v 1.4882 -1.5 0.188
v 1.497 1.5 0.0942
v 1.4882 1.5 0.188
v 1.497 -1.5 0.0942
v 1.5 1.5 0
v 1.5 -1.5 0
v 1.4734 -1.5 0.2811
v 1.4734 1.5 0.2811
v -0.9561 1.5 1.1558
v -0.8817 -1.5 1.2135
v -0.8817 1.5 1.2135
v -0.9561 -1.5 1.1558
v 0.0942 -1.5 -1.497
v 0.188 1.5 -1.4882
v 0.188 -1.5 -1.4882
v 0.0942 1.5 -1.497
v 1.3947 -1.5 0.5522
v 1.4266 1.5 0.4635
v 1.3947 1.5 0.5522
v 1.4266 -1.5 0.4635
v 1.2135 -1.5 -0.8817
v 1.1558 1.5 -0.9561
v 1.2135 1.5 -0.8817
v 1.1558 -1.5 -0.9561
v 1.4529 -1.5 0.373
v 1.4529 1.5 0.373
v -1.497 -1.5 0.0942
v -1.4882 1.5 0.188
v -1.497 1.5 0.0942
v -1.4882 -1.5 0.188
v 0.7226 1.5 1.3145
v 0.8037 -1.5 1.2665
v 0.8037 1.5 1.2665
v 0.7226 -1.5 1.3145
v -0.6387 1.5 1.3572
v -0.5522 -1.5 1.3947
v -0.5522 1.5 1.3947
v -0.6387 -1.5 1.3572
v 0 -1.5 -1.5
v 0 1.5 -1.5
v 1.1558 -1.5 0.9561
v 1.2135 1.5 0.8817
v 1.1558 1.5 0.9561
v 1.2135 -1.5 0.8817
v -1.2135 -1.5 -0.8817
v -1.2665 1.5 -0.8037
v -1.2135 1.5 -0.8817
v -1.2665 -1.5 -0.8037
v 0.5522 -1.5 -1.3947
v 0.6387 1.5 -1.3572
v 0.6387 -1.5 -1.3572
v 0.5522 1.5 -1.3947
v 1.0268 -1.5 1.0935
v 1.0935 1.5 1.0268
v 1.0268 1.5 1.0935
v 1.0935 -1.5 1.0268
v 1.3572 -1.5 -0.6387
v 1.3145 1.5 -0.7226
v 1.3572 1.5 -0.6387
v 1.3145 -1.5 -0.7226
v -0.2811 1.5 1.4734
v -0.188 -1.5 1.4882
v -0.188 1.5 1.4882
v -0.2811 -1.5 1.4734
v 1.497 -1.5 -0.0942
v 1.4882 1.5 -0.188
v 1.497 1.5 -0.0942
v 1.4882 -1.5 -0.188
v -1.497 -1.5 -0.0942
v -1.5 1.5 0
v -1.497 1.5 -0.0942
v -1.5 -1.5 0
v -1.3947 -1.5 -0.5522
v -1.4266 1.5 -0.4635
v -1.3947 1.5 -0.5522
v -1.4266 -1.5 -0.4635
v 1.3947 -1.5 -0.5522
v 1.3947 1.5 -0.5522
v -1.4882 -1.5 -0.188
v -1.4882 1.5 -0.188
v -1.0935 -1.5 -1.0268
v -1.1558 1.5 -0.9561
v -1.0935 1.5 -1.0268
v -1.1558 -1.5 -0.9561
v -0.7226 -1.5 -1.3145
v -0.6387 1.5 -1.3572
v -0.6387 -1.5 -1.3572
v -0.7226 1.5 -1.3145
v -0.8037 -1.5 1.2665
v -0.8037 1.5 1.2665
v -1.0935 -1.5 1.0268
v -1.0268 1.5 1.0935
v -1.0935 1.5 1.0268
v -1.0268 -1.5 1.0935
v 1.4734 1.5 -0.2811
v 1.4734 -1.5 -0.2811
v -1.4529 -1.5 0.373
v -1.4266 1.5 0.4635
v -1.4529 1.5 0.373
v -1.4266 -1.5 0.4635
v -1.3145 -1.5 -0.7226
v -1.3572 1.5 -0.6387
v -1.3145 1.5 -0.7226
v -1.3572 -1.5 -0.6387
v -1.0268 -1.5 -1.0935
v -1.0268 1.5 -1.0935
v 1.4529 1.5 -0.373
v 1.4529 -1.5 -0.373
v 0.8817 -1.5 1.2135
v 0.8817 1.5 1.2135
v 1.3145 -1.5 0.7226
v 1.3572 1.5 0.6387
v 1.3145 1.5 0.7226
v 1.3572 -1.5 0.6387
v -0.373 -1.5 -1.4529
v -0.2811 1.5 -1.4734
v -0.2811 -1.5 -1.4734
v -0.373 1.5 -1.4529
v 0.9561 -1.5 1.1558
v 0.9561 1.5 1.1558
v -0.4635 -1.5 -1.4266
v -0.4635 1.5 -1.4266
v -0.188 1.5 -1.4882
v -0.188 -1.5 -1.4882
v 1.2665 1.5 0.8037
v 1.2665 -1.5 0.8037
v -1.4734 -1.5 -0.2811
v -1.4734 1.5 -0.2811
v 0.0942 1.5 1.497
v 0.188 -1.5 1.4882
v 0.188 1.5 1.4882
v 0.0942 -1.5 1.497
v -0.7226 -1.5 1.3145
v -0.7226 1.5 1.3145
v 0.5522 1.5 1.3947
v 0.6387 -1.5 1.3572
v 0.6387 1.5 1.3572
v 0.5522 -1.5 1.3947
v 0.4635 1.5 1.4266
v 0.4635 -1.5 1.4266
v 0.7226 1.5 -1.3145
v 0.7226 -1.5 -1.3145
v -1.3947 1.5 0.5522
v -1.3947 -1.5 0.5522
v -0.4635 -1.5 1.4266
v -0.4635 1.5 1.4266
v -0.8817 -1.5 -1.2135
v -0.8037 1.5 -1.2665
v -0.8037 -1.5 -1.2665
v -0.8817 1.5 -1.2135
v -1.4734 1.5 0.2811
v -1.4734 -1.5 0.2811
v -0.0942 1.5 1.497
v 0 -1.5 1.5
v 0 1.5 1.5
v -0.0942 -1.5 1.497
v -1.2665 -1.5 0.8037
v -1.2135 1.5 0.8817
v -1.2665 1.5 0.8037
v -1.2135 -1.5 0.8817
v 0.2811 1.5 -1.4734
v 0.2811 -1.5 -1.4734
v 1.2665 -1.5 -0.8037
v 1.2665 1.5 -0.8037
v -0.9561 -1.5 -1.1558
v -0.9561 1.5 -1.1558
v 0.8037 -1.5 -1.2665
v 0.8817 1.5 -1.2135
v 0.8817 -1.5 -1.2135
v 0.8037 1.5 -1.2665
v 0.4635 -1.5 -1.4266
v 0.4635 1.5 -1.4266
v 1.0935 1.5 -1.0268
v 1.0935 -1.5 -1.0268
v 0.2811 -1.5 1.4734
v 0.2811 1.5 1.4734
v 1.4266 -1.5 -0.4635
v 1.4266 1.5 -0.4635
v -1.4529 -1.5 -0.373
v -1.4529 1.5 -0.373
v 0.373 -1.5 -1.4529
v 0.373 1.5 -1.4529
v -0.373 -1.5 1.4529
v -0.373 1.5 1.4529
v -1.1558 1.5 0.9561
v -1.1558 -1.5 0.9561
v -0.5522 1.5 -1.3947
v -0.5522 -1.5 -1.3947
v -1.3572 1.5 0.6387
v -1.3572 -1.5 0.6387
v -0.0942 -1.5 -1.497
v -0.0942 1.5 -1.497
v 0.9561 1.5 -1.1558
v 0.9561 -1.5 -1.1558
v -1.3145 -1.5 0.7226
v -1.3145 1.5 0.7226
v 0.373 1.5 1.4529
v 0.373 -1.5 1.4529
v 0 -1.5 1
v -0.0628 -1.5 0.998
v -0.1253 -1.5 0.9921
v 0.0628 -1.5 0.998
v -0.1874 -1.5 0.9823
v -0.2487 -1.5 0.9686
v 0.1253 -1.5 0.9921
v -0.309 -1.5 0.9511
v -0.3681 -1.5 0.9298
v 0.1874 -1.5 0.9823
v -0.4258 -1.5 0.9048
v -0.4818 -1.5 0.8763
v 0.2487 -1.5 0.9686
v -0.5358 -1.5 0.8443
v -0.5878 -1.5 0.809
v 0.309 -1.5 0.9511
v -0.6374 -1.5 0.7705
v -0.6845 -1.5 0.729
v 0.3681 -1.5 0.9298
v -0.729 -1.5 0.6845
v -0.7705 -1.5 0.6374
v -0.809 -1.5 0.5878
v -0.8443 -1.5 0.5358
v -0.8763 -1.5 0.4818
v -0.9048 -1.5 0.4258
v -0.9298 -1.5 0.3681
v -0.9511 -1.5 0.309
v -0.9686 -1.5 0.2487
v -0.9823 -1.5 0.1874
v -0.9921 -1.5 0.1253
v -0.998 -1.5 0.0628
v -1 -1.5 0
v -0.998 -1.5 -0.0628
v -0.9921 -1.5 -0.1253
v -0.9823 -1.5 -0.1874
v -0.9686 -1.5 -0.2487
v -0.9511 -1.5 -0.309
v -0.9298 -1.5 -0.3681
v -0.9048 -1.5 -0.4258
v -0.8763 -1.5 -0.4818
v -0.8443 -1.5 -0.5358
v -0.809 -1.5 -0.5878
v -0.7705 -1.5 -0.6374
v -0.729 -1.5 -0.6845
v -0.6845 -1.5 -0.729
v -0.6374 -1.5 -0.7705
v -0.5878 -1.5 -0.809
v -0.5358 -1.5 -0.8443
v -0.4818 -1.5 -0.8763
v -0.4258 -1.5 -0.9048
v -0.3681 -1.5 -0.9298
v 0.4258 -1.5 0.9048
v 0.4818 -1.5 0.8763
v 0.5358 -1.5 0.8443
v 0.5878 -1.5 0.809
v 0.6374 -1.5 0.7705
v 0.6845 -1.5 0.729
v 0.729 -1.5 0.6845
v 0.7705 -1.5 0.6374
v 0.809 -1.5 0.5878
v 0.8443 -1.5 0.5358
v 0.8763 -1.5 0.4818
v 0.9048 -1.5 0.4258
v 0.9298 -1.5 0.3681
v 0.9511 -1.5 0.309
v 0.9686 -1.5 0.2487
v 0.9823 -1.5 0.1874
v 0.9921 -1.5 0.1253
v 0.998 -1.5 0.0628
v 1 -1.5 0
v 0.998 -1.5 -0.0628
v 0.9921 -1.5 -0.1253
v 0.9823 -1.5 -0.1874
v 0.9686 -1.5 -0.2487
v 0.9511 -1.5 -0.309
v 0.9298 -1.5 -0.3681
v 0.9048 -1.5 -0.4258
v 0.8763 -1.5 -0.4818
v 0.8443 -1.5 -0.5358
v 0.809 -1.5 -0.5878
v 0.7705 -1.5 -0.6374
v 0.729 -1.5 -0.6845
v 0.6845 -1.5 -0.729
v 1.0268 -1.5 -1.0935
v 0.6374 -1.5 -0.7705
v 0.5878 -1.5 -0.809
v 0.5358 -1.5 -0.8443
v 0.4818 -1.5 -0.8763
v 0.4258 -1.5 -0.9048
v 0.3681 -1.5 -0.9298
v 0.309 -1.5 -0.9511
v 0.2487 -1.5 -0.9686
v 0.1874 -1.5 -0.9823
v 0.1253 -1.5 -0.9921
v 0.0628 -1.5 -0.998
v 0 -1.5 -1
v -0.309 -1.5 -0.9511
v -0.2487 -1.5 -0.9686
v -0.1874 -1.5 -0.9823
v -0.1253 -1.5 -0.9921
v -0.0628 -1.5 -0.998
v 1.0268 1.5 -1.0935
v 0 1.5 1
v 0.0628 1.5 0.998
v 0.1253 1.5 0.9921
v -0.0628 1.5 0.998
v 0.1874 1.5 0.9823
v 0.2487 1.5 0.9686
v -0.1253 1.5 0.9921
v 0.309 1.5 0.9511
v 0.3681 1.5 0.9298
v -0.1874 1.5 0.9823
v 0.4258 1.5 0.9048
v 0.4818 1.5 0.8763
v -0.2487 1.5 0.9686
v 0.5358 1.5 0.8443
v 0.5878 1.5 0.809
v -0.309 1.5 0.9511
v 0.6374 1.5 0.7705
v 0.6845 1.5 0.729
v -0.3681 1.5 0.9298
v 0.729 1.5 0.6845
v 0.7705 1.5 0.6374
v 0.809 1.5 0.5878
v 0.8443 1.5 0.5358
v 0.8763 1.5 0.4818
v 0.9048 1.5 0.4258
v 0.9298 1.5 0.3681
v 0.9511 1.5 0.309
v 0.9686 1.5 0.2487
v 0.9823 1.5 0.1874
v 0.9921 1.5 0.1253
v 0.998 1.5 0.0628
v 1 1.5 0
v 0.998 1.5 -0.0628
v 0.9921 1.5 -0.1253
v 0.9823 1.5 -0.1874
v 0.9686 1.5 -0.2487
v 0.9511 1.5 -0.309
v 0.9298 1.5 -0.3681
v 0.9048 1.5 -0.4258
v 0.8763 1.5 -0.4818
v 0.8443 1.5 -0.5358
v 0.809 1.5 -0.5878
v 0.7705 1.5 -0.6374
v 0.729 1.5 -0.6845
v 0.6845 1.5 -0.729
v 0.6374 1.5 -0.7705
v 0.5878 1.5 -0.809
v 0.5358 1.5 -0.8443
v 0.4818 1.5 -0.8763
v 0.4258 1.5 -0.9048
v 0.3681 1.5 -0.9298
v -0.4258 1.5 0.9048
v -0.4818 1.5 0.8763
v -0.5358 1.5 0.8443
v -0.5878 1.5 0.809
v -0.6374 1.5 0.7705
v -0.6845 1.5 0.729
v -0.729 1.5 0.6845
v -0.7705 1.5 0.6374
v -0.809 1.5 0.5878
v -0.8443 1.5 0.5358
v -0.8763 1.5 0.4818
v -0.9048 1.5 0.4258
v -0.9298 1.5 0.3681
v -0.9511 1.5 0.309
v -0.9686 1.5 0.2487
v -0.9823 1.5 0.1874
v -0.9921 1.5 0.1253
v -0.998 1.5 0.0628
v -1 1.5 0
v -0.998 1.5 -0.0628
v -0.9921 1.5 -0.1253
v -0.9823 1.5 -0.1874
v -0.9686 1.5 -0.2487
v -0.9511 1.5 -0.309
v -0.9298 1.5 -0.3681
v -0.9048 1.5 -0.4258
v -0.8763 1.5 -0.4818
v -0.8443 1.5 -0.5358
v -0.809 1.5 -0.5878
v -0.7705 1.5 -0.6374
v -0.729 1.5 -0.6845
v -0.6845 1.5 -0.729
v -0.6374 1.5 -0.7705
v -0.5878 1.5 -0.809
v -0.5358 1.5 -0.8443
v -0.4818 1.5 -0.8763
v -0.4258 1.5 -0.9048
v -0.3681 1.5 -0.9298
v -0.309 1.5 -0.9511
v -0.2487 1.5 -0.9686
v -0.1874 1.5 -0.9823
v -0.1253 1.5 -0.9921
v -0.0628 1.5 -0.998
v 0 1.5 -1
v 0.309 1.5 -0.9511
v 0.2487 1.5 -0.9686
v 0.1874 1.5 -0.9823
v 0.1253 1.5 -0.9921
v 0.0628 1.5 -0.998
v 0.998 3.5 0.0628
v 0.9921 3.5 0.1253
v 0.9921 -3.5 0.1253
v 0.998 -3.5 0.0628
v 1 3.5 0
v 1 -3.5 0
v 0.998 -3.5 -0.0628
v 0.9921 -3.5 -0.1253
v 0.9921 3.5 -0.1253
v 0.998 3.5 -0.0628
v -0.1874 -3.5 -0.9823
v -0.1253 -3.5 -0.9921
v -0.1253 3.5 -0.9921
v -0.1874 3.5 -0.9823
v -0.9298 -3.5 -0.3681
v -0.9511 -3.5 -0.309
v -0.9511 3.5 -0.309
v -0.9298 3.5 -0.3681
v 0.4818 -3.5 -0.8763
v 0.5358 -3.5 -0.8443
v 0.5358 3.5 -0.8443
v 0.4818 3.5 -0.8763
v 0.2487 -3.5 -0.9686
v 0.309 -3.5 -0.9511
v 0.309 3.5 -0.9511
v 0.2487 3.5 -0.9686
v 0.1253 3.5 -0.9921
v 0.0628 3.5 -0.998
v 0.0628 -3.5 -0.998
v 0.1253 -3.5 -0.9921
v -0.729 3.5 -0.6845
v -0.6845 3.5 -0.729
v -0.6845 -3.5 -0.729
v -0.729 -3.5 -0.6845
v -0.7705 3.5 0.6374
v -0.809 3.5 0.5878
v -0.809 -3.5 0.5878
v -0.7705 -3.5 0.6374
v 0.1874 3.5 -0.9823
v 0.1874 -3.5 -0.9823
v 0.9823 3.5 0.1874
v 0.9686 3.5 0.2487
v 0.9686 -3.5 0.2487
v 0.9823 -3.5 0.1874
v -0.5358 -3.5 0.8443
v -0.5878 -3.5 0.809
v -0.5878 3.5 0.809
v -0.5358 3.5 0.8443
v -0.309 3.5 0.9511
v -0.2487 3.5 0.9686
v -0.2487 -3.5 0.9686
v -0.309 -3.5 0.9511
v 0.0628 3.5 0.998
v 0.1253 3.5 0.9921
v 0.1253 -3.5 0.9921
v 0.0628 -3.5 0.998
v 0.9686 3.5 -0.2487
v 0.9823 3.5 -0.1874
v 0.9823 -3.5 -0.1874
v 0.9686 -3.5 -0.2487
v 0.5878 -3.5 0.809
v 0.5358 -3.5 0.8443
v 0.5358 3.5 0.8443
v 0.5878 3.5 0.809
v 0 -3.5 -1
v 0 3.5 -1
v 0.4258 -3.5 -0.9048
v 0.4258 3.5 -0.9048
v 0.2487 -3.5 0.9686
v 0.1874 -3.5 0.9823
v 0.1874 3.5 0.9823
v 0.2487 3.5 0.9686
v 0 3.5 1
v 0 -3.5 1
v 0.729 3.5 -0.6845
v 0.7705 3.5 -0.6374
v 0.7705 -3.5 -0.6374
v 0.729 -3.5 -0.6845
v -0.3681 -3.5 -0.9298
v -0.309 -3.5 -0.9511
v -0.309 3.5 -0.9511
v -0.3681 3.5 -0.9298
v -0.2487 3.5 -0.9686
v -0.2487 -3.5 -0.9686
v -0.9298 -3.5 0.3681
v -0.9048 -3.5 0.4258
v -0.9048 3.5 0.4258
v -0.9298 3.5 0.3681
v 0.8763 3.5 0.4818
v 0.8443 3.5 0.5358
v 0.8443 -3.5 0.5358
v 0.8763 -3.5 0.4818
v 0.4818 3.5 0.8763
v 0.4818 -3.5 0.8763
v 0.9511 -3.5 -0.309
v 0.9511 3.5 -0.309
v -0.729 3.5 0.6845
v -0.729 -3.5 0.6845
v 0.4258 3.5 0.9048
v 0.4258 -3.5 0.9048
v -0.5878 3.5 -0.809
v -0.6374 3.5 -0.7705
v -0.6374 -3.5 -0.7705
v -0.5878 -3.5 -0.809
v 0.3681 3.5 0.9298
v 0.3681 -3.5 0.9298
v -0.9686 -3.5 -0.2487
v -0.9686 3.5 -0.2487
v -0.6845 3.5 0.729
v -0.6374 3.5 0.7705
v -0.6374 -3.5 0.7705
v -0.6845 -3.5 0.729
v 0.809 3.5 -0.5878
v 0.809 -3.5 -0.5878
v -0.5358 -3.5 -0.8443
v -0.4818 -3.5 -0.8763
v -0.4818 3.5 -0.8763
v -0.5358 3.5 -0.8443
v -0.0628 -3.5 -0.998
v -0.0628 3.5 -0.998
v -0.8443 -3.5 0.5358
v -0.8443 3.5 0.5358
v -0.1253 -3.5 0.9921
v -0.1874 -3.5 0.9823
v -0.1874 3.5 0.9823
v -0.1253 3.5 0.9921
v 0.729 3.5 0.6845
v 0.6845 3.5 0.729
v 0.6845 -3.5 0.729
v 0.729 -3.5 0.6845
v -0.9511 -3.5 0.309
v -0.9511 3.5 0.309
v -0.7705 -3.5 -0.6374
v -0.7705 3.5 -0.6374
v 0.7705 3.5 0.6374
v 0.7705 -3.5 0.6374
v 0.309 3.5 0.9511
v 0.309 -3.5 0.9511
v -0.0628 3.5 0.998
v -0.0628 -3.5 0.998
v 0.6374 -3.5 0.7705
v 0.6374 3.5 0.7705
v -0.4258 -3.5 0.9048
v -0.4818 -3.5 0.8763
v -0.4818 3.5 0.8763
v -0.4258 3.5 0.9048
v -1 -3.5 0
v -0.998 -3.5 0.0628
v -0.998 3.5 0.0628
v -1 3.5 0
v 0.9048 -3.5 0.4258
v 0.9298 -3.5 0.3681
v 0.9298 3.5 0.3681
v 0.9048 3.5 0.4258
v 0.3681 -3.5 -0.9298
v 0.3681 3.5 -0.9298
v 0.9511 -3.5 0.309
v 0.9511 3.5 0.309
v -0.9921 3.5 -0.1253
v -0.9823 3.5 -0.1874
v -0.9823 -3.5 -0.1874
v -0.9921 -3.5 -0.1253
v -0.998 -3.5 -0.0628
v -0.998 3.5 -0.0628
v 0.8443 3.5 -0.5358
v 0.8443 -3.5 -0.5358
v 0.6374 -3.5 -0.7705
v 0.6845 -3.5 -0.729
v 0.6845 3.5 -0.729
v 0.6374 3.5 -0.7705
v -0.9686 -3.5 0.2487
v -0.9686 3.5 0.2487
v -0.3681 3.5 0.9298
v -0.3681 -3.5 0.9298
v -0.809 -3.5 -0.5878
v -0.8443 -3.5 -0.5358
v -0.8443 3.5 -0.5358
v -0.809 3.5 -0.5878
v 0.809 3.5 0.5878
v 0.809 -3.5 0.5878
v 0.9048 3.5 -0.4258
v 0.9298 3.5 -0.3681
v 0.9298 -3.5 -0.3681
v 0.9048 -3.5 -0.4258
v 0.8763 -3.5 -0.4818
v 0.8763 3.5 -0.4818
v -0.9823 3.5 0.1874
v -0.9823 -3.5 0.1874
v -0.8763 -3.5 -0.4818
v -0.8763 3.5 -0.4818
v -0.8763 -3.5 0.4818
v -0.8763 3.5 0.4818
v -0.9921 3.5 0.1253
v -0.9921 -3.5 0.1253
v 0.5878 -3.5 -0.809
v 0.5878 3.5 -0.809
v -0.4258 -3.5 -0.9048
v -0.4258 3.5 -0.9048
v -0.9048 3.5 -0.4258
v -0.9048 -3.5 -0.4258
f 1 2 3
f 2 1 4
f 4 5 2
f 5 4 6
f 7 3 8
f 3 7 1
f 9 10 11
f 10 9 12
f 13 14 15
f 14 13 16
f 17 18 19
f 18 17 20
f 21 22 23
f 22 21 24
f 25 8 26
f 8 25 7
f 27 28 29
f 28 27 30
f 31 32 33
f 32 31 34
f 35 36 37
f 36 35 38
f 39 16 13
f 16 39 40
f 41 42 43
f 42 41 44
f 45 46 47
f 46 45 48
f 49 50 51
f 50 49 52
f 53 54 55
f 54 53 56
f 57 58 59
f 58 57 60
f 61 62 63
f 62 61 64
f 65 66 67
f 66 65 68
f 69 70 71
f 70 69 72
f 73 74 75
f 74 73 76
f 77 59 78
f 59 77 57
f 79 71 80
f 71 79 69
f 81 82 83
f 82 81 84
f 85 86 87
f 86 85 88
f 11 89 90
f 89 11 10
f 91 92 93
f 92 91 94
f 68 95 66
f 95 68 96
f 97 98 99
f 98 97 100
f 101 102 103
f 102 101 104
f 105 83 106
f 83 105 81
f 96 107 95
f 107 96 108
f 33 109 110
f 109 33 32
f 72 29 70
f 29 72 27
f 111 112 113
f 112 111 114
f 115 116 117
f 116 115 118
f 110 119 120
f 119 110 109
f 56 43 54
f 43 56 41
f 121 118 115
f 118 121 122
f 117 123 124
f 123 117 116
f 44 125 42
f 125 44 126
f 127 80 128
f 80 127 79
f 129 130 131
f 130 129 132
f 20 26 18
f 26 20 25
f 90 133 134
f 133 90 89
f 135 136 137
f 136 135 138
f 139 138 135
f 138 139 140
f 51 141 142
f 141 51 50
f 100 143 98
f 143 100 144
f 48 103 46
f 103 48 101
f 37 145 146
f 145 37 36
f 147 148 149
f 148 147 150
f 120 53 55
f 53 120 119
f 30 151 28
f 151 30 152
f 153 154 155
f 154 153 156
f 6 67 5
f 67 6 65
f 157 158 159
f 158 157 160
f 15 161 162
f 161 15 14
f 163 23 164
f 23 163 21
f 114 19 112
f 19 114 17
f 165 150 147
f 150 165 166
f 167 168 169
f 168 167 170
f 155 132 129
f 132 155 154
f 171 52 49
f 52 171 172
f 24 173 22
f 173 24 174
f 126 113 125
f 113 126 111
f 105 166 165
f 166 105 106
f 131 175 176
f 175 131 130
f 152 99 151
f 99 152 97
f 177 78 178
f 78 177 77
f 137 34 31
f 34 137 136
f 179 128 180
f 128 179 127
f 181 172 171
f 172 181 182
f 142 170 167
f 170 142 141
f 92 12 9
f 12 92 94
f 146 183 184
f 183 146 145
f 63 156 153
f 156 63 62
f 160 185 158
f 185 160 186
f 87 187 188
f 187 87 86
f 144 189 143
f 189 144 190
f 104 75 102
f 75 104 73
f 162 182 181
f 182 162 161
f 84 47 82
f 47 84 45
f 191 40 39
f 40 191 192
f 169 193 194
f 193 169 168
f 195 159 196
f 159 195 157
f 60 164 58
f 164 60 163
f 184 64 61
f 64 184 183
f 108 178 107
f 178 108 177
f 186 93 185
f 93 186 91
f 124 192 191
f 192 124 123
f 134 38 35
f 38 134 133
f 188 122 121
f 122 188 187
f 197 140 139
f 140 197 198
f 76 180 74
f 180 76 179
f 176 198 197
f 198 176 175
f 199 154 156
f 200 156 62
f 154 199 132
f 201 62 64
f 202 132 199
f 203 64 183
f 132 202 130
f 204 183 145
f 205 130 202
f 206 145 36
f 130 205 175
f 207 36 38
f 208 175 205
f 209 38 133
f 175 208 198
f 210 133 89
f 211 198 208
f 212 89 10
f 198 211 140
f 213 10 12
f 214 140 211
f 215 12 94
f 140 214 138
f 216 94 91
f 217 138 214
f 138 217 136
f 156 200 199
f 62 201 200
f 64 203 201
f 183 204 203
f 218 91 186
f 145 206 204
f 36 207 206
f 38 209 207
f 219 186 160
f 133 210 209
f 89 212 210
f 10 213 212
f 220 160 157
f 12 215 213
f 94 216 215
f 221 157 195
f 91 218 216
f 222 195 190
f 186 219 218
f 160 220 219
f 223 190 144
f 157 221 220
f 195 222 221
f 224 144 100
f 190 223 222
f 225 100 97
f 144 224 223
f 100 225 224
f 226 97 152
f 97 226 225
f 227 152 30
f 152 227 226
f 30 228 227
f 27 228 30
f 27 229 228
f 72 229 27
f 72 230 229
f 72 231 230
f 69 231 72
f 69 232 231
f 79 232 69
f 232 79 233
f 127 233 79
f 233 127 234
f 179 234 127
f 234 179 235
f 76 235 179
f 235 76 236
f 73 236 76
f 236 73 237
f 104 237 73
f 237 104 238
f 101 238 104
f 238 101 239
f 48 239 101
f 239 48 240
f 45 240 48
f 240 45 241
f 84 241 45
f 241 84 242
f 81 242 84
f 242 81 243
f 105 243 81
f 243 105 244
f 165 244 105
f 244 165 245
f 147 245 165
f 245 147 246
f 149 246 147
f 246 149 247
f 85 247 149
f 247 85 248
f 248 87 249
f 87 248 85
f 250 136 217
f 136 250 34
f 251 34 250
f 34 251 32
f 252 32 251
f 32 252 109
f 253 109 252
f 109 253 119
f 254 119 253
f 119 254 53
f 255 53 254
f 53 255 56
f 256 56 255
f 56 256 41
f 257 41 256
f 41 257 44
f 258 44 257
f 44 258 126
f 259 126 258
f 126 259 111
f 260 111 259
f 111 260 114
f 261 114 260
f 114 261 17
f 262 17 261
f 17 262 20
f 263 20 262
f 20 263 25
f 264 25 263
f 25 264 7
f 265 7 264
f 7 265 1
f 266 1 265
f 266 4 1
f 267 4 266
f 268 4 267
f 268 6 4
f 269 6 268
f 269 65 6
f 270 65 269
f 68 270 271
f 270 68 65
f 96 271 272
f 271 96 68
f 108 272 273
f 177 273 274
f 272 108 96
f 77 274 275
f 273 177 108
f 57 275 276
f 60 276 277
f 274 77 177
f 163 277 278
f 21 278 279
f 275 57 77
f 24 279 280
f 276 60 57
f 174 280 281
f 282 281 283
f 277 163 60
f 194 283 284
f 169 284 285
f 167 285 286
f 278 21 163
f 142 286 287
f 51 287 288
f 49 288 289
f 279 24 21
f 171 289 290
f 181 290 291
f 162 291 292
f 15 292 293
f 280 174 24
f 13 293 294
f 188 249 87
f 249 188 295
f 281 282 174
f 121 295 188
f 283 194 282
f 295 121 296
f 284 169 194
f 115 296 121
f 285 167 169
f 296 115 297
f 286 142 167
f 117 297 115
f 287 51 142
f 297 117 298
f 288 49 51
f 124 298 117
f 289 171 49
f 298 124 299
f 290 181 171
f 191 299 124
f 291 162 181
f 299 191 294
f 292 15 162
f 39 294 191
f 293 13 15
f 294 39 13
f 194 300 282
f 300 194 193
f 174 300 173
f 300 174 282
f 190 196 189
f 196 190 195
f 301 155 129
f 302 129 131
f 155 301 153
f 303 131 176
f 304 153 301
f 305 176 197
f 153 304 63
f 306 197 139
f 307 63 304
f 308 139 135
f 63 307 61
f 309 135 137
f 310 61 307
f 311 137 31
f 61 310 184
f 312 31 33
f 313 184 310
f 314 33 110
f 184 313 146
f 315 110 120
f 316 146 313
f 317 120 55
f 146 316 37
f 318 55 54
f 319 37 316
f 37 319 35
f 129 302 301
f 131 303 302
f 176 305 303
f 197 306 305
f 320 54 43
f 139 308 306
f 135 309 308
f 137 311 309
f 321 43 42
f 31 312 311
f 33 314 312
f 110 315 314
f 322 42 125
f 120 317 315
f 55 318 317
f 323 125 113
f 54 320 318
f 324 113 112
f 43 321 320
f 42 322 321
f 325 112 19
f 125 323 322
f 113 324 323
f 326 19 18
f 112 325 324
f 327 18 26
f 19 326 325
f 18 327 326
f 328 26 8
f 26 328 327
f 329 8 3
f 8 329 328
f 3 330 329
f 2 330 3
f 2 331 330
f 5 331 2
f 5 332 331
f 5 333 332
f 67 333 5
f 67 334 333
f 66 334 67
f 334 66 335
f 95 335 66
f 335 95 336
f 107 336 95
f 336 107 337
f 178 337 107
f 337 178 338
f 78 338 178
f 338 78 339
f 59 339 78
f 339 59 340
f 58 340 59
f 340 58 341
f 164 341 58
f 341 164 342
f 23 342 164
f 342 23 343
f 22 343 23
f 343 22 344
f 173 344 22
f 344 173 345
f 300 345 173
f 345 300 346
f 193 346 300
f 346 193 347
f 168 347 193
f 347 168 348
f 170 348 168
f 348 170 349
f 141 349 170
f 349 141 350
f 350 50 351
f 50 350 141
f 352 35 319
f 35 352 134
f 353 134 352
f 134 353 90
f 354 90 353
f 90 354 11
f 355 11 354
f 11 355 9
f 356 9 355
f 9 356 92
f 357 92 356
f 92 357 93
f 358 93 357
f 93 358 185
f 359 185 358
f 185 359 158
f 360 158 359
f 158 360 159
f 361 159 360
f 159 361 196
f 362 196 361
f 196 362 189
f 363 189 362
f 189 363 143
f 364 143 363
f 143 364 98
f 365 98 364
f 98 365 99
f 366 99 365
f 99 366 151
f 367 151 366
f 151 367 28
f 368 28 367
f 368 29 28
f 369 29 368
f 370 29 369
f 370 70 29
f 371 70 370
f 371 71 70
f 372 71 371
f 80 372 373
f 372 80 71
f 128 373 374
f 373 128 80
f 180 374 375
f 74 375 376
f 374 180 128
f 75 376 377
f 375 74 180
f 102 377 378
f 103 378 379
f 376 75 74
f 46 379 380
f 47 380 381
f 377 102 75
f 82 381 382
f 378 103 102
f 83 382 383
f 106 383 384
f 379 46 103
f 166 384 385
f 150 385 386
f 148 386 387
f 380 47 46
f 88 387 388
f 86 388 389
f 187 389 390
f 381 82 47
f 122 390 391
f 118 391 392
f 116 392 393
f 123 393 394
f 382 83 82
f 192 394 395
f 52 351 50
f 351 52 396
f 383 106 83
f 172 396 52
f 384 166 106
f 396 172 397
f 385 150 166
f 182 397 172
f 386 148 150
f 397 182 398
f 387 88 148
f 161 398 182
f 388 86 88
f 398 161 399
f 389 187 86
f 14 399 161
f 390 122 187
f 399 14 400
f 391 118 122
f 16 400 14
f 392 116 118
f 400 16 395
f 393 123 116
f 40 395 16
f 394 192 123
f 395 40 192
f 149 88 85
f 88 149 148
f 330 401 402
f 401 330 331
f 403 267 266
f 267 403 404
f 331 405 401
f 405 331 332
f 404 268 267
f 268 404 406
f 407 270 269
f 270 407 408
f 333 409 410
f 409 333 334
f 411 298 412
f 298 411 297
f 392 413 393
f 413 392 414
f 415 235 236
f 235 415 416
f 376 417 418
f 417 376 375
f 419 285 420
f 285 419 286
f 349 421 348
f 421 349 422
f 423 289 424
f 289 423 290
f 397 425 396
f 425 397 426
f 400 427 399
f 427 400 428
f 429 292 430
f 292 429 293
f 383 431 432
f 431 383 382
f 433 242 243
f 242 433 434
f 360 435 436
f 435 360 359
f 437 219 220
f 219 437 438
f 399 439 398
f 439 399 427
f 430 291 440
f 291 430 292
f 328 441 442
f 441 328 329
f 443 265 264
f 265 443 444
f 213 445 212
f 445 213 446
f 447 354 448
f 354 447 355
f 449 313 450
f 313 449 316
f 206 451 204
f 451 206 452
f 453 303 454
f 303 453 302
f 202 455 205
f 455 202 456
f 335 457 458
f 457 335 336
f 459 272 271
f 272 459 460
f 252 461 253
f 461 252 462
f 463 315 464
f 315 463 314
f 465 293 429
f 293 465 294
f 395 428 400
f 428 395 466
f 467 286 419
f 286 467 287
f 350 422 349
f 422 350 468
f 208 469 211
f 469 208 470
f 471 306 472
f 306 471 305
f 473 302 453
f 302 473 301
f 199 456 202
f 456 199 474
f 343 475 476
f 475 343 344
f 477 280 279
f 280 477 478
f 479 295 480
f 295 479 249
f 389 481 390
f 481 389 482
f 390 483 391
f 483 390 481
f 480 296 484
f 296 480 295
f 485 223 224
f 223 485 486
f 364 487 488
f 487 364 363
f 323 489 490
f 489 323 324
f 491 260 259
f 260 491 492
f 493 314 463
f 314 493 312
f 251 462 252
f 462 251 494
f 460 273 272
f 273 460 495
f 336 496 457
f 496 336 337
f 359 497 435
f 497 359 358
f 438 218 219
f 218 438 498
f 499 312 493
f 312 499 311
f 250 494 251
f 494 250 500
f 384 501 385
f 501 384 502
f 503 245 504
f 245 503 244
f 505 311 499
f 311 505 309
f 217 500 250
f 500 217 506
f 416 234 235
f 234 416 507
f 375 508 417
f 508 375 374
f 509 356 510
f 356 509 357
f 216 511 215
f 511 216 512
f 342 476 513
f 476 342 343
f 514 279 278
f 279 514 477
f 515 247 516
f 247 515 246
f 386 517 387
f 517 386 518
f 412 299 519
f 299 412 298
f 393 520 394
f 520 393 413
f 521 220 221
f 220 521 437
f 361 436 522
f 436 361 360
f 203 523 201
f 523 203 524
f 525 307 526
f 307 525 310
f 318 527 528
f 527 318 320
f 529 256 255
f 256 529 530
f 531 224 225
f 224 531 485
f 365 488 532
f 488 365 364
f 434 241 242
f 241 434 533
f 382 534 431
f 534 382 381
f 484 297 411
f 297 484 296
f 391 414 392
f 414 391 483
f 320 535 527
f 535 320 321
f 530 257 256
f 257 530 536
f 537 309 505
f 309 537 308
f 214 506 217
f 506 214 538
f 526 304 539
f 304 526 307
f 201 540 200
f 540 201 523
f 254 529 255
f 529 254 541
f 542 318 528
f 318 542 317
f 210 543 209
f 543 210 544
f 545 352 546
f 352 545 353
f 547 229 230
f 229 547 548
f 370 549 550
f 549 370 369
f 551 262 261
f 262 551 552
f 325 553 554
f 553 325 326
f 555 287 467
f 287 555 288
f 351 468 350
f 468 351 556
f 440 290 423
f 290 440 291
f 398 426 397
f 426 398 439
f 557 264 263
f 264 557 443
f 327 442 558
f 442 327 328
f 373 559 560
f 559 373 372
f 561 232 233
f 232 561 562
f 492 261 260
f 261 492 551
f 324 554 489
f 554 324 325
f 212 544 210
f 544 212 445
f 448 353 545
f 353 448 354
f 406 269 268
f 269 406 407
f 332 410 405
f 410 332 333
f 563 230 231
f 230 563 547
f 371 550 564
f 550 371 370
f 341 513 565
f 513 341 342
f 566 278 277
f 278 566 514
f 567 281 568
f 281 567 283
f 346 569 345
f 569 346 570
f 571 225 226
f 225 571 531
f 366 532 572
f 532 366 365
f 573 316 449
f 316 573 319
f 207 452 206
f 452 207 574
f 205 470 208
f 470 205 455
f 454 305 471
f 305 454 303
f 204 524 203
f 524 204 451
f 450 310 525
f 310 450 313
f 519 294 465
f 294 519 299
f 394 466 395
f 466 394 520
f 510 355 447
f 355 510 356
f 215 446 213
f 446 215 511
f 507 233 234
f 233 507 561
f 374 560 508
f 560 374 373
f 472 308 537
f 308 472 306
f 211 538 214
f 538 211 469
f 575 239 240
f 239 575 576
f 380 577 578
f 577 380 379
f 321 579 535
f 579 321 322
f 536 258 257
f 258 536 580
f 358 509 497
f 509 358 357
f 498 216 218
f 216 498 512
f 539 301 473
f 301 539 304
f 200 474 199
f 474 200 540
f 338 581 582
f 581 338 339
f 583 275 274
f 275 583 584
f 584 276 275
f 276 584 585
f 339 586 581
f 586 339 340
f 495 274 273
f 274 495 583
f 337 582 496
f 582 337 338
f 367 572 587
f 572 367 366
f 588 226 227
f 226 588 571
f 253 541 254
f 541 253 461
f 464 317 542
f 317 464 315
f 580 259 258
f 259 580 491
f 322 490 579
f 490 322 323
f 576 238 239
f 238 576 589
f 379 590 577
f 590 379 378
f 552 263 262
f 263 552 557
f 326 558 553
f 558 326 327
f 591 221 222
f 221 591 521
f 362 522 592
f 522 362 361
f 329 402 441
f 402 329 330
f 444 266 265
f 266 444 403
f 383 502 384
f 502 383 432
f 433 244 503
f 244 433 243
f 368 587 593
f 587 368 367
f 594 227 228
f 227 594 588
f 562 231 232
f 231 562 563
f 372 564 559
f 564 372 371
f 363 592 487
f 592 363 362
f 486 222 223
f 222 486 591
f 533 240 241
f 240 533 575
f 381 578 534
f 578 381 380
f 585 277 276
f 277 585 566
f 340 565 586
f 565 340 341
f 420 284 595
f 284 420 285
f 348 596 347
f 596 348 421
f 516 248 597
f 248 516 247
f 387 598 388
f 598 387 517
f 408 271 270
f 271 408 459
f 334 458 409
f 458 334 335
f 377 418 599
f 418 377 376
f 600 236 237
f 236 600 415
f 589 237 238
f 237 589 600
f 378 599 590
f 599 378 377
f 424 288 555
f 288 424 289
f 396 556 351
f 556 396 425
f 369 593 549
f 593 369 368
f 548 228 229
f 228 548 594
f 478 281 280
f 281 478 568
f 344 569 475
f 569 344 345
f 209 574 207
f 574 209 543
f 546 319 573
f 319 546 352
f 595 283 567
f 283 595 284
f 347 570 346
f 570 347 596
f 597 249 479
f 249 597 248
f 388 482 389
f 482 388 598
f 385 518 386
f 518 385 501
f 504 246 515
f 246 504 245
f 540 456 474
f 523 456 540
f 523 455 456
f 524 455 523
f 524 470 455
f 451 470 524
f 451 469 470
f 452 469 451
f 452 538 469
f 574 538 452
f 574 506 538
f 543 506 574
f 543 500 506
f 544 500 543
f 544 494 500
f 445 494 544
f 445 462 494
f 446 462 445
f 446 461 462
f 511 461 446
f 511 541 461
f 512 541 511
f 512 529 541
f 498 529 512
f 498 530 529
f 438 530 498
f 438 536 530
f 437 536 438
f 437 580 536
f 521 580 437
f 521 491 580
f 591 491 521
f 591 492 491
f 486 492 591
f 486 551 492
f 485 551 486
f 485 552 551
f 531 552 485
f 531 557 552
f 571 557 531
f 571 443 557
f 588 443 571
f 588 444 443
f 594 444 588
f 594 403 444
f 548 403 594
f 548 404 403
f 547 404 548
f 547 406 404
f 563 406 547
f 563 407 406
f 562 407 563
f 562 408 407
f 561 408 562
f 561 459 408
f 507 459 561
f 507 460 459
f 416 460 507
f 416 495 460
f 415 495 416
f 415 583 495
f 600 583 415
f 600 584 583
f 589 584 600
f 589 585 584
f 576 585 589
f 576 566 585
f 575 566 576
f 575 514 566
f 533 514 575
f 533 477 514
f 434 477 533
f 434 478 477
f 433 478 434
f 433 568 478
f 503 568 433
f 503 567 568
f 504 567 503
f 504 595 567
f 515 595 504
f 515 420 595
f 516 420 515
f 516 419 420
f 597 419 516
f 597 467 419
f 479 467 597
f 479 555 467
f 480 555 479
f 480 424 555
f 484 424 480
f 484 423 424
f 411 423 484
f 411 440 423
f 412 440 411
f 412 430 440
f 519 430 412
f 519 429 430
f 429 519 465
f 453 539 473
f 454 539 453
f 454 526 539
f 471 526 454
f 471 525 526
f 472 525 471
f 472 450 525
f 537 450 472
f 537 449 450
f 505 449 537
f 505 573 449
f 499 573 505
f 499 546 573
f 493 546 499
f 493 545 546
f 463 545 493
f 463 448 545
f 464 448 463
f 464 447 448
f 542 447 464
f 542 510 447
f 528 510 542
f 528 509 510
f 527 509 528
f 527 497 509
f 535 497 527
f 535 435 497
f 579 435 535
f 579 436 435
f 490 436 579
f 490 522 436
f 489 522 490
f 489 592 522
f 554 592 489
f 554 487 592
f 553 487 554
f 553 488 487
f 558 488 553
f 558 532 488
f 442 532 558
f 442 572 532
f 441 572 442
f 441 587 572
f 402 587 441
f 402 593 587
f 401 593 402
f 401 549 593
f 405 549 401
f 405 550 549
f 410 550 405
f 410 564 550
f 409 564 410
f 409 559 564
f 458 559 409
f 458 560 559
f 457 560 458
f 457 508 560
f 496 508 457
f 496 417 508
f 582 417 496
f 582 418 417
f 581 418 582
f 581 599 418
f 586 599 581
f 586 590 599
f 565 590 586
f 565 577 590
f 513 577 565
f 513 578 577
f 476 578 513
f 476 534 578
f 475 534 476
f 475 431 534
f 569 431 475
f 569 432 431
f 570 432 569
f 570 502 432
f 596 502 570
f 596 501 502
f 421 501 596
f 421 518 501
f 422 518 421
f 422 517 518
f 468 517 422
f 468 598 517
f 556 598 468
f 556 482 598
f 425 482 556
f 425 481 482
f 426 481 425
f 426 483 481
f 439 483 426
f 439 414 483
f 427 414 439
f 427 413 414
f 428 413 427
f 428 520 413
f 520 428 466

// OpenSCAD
// === Parámetros ===
radio_exterior_abrazadera = 1.5;
radio_interior_abrazadera = 1;
profundidad_abrazadera = 3.0;

$fn = 100; // suavidad

// === Módulo de abrazadera (aro hueco) ===
module aro_abrazadera() {
    difference() {
        // Cilindro exterior
        cylinder(h = profundidad_abrazadera, r = radio_exterior_abrazadera, center = true);

        // Hueco interior
        cylinder(h = profundidad_abrazadera + 0.1, r = radio_interior_abrazadera, center = true);
    }
}

// === Mostrar eje y abrazadera juntos ===
module eje_horizontal() {
    rotate([90, 0, 0])
        cylinder(h = 7.0, r = 1.0, center = true);
}

// Ensamblaje: aro abrazadera + eje
eje_horizontal();
 // Rota para que el aro quede en la posición correcta    translate([0, 5, 0]) // Ajusta la posición del aro
translate([0, 0, 0])
    rotate([90, 0, 0])
        aro_abrazadera();
